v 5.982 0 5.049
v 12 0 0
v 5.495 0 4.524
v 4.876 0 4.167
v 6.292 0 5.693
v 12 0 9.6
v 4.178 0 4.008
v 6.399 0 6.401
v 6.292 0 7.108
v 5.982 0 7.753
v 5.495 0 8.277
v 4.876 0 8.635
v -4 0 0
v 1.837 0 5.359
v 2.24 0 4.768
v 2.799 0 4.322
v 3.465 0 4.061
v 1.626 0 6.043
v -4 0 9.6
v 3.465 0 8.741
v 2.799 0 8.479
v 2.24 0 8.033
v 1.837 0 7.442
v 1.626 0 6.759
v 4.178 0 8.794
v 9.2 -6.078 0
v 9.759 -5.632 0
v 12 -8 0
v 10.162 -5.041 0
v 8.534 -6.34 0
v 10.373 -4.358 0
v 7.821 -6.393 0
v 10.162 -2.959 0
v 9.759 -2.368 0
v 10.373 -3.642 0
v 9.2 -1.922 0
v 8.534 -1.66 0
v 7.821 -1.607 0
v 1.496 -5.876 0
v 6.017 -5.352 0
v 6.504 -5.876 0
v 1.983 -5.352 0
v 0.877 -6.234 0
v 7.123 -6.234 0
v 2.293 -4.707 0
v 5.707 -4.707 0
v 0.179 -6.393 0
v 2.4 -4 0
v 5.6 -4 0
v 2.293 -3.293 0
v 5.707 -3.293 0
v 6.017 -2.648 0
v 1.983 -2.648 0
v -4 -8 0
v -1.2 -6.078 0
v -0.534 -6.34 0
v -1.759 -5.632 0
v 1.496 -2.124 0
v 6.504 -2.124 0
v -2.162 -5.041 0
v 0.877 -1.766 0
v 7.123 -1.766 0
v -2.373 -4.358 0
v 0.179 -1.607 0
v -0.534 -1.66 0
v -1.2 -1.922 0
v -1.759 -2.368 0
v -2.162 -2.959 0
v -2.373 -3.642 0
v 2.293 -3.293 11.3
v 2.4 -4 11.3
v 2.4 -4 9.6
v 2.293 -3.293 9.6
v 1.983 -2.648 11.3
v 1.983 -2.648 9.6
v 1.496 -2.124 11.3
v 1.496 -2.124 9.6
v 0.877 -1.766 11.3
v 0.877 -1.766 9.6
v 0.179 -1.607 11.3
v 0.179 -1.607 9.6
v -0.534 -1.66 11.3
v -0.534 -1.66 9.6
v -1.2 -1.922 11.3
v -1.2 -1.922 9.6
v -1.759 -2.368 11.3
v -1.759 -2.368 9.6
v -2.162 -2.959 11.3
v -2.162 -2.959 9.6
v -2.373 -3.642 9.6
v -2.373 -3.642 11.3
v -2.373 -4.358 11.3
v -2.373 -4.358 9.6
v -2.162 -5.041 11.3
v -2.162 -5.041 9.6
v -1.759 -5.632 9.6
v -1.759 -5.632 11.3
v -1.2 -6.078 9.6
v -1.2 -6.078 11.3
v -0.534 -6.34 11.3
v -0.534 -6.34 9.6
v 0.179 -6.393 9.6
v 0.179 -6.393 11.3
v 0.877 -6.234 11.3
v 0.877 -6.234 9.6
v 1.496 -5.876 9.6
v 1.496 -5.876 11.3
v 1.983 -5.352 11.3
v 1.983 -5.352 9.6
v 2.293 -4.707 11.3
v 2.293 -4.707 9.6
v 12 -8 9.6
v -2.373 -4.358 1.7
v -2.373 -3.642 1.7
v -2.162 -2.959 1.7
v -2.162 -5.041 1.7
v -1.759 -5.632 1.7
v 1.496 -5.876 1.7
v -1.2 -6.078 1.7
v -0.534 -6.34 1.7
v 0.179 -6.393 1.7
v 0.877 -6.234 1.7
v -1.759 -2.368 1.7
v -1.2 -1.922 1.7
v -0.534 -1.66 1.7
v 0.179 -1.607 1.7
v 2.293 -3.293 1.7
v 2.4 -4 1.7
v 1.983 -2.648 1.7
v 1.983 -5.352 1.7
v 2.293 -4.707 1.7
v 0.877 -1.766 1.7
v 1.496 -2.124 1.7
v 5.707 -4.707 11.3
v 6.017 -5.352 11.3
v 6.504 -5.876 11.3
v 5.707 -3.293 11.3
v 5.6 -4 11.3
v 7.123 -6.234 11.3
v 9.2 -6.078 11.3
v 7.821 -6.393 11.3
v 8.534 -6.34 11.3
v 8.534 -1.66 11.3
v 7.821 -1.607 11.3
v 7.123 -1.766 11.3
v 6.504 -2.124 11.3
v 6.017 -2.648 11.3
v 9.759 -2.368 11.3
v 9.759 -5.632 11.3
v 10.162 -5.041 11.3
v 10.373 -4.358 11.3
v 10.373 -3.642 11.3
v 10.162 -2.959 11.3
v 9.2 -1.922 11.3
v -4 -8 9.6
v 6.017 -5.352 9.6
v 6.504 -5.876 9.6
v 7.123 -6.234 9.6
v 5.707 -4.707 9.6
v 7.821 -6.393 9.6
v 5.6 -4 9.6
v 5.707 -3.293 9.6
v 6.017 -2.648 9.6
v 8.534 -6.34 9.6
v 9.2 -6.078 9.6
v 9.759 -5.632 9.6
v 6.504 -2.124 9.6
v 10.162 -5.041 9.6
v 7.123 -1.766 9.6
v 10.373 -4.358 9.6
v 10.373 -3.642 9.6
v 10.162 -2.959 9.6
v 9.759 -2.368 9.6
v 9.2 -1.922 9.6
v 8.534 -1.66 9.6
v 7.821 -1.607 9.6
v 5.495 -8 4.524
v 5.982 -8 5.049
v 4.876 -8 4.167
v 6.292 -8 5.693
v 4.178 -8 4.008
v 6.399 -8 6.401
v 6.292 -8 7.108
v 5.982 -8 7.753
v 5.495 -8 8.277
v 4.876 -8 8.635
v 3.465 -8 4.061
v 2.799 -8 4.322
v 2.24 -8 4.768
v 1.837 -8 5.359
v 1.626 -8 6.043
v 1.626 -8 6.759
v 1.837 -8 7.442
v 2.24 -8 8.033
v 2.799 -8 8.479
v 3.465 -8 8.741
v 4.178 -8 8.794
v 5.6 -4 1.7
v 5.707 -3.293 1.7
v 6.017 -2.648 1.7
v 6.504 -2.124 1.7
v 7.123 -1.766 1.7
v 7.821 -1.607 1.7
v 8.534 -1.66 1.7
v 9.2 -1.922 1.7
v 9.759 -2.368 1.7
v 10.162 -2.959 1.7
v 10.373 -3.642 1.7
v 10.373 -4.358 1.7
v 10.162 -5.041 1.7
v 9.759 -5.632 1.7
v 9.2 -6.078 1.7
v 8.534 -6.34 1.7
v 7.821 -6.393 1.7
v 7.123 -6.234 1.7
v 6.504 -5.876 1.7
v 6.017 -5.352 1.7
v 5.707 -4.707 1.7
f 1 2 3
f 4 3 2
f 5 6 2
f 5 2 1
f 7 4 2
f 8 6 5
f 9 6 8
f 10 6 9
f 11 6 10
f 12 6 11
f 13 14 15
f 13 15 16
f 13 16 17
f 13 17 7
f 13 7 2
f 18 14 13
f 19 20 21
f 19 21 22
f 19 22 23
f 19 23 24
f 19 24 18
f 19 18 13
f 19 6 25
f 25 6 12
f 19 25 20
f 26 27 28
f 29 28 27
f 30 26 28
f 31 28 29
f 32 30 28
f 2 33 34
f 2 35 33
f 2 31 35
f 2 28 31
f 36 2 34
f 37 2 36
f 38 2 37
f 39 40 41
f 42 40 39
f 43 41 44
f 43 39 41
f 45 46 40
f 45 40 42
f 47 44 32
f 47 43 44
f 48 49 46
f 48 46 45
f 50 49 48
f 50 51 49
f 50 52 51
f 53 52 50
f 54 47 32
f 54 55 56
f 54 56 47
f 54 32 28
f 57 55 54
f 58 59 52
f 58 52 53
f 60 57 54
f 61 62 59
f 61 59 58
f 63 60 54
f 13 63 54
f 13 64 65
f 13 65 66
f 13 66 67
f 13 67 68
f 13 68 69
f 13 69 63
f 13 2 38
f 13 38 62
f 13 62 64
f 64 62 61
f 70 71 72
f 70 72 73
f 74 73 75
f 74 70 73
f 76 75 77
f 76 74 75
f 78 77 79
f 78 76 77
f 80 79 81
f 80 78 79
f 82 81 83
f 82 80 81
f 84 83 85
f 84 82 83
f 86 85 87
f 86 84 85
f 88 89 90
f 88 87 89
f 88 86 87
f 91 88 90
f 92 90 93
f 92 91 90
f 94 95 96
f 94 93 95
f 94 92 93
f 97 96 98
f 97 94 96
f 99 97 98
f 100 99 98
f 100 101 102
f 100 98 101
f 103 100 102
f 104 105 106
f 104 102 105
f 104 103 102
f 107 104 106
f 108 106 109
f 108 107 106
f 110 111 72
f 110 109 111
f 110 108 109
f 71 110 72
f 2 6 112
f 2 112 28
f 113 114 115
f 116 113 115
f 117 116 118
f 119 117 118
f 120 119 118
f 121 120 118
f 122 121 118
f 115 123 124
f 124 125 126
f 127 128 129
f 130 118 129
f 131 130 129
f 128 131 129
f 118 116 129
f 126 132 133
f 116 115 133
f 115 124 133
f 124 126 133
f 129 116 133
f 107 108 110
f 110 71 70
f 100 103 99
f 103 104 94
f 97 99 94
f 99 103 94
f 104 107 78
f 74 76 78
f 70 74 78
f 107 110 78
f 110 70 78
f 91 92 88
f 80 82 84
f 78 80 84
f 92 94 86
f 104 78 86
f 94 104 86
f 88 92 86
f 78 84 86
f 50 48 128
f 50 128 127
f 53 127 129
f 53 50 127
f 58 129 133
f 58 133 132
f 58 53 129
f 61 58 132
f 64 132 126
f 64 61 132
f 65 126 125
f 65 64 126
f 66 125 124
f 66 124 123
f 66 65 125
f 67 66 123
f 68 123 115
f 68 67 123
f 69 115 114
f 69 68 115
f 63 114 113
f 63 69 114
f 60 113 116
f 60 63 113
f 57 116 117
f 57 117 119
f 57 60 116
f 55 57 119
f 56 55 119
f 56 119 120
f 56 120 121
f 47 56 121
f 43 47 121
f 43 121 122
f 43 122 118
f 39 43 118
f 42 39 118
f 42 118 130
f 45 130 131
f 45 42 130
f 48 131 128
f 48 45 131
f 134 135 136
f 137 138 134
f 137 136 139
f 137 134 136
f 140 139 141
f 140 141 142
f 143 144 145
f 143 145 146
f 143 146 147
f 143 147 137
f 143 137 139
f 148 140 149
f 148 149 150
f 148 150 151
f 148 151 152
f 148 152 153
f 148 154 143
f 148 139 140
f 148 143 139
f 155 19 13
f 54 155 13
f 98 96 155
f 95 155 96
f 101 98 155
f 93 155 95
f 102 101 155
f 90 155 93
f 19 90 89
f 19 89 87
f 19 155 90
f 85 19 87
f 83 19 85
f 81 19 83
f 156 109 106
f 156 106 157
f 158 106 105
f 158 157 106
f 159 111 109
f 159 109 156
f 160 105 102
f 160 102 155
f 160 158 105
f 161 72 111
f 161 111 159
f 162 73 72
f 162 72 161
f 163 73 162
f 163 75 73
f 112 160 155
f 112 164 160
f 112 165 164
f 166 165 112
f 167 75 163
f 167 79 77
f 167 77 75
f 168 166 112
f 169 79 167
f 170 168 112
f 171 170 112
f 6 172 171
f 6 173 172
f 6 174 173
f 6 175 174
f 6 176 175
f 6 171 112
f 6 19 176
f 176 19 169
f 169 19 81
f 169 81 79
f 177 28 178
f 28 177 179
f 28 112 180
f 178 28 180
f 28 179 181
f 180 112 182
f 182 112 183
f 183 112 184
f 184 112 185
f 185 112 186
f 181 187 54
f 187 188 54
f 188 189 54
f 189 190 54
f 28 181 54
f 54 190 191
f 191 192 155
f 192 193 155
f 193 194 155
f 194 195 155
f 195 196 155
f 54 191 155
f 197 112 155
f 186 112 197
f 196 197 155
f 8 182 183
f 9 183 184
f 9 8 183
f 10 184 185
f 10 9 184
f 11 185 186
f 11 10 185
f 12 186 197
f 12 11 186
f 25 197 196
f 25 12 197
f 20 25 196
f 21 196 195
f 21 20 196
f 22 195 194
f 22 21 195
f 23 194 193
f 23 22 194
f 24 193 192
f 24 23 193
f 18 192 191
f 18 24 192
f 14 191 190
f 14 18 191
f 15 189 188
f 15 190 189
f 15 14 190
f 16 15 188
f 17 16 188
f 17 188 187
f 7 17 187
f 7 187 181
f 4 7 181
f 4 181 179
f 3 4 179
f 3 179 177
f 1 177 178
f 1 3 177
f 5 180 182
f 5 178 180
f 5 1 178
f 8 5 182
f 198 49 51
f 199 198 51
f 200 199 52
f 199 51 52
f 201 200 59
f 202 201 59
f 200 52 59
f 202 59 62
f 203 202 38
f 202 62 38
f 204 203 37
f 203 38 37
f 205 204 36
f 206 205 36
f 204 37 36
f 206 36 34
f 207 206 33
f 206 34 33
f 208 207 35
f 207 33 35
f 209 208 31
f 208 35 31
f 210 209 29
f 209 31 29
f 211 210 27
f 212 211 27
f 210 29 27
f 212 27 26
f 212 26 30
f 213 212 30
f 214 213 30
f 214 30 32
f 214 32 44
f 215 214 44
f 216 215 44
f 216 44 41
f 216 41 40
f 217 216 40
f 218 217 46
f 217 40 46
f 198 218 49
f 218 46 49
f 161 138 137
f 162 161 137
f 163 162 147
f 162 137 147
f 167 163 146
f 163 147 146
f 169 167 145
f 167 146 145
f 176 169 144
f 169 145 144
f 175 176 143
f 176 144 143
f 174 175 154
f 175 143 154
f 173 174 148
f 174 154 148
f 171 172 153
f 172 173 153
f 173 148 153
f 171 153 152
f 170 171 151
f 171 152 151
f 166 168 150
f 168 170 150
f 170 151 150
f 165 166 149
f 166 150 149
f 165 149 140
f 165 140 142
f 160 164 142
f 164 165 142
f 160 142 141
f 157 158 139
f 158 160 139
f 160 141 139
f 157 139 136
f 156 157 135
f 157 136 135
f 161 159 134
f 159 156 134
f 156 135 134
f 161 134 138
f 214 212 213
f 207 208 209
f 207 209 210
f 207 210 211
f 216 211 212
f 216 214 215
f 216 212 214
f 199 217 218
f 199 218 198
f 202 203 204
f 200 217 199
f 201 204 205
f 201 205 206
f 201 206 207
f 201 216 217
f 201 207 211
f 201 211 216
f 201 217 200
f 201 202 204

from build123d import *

# Parameters (mm, degrees)
F1_DEPTH  = 8
F3_W      = 8
F3_H      = 8
F3_R      = 2.4
F4_DEPTH  = 1.7
F5_R      = 2.4
F6_DEPTH  = 1.7
F9_R      = 2.4
F10_DEPTH = 25.4


with BuildPart() as f1:
    # F0 (on Front) → F1 (new body)
    with BuildSketch(Plane.XZ):
        Polygon((-2.4, 9.6), (-4, 9.6), (-4, 0), (4, 0), (4, 9.6), (2.4, 9.6), (2.4, 11.3), (-2.4, 11.3), align=None)
    extrude(amount=F1_DEPTH)

    # F3 (on plane+point) → F4 (cut, through all)
    with BuildSketch(Plane.XY.offset(11.3)):
        with Locations((0, -4)):
            Rectangle(F3_W, F3_H)
        with Locations((0, -4)):
            Circle(F3_R, mode=Mode.SUBTRACT)
    extrude(amount=-F4_DEPTH, mode=Mode.SUBTRACT)

    # F5 (on Top) → F6 (cut)
    with BuildSketch(Plane.XY):
        with Locations((0, -4)):
            Circle(F5_R)
    extrude(amount=F6_DEPTH, mode=Mode.SUBTRACT)

    # F8: F1 across plane


with BuildPart() as f1_1:
    add(f1.part)
    add(f1.part.mirror(Plane.YZ.offset(4)))

    # F9 (on Front) → F10 (cut)
    with BuildSketch(Plane.XZ):
        with Locations((3.999, 6.4008)):
            Circle(F9_R)
    extrude(amount=F10_DEPTH, mode=Mode.SUBTRACT)


solid = f1_1.part
